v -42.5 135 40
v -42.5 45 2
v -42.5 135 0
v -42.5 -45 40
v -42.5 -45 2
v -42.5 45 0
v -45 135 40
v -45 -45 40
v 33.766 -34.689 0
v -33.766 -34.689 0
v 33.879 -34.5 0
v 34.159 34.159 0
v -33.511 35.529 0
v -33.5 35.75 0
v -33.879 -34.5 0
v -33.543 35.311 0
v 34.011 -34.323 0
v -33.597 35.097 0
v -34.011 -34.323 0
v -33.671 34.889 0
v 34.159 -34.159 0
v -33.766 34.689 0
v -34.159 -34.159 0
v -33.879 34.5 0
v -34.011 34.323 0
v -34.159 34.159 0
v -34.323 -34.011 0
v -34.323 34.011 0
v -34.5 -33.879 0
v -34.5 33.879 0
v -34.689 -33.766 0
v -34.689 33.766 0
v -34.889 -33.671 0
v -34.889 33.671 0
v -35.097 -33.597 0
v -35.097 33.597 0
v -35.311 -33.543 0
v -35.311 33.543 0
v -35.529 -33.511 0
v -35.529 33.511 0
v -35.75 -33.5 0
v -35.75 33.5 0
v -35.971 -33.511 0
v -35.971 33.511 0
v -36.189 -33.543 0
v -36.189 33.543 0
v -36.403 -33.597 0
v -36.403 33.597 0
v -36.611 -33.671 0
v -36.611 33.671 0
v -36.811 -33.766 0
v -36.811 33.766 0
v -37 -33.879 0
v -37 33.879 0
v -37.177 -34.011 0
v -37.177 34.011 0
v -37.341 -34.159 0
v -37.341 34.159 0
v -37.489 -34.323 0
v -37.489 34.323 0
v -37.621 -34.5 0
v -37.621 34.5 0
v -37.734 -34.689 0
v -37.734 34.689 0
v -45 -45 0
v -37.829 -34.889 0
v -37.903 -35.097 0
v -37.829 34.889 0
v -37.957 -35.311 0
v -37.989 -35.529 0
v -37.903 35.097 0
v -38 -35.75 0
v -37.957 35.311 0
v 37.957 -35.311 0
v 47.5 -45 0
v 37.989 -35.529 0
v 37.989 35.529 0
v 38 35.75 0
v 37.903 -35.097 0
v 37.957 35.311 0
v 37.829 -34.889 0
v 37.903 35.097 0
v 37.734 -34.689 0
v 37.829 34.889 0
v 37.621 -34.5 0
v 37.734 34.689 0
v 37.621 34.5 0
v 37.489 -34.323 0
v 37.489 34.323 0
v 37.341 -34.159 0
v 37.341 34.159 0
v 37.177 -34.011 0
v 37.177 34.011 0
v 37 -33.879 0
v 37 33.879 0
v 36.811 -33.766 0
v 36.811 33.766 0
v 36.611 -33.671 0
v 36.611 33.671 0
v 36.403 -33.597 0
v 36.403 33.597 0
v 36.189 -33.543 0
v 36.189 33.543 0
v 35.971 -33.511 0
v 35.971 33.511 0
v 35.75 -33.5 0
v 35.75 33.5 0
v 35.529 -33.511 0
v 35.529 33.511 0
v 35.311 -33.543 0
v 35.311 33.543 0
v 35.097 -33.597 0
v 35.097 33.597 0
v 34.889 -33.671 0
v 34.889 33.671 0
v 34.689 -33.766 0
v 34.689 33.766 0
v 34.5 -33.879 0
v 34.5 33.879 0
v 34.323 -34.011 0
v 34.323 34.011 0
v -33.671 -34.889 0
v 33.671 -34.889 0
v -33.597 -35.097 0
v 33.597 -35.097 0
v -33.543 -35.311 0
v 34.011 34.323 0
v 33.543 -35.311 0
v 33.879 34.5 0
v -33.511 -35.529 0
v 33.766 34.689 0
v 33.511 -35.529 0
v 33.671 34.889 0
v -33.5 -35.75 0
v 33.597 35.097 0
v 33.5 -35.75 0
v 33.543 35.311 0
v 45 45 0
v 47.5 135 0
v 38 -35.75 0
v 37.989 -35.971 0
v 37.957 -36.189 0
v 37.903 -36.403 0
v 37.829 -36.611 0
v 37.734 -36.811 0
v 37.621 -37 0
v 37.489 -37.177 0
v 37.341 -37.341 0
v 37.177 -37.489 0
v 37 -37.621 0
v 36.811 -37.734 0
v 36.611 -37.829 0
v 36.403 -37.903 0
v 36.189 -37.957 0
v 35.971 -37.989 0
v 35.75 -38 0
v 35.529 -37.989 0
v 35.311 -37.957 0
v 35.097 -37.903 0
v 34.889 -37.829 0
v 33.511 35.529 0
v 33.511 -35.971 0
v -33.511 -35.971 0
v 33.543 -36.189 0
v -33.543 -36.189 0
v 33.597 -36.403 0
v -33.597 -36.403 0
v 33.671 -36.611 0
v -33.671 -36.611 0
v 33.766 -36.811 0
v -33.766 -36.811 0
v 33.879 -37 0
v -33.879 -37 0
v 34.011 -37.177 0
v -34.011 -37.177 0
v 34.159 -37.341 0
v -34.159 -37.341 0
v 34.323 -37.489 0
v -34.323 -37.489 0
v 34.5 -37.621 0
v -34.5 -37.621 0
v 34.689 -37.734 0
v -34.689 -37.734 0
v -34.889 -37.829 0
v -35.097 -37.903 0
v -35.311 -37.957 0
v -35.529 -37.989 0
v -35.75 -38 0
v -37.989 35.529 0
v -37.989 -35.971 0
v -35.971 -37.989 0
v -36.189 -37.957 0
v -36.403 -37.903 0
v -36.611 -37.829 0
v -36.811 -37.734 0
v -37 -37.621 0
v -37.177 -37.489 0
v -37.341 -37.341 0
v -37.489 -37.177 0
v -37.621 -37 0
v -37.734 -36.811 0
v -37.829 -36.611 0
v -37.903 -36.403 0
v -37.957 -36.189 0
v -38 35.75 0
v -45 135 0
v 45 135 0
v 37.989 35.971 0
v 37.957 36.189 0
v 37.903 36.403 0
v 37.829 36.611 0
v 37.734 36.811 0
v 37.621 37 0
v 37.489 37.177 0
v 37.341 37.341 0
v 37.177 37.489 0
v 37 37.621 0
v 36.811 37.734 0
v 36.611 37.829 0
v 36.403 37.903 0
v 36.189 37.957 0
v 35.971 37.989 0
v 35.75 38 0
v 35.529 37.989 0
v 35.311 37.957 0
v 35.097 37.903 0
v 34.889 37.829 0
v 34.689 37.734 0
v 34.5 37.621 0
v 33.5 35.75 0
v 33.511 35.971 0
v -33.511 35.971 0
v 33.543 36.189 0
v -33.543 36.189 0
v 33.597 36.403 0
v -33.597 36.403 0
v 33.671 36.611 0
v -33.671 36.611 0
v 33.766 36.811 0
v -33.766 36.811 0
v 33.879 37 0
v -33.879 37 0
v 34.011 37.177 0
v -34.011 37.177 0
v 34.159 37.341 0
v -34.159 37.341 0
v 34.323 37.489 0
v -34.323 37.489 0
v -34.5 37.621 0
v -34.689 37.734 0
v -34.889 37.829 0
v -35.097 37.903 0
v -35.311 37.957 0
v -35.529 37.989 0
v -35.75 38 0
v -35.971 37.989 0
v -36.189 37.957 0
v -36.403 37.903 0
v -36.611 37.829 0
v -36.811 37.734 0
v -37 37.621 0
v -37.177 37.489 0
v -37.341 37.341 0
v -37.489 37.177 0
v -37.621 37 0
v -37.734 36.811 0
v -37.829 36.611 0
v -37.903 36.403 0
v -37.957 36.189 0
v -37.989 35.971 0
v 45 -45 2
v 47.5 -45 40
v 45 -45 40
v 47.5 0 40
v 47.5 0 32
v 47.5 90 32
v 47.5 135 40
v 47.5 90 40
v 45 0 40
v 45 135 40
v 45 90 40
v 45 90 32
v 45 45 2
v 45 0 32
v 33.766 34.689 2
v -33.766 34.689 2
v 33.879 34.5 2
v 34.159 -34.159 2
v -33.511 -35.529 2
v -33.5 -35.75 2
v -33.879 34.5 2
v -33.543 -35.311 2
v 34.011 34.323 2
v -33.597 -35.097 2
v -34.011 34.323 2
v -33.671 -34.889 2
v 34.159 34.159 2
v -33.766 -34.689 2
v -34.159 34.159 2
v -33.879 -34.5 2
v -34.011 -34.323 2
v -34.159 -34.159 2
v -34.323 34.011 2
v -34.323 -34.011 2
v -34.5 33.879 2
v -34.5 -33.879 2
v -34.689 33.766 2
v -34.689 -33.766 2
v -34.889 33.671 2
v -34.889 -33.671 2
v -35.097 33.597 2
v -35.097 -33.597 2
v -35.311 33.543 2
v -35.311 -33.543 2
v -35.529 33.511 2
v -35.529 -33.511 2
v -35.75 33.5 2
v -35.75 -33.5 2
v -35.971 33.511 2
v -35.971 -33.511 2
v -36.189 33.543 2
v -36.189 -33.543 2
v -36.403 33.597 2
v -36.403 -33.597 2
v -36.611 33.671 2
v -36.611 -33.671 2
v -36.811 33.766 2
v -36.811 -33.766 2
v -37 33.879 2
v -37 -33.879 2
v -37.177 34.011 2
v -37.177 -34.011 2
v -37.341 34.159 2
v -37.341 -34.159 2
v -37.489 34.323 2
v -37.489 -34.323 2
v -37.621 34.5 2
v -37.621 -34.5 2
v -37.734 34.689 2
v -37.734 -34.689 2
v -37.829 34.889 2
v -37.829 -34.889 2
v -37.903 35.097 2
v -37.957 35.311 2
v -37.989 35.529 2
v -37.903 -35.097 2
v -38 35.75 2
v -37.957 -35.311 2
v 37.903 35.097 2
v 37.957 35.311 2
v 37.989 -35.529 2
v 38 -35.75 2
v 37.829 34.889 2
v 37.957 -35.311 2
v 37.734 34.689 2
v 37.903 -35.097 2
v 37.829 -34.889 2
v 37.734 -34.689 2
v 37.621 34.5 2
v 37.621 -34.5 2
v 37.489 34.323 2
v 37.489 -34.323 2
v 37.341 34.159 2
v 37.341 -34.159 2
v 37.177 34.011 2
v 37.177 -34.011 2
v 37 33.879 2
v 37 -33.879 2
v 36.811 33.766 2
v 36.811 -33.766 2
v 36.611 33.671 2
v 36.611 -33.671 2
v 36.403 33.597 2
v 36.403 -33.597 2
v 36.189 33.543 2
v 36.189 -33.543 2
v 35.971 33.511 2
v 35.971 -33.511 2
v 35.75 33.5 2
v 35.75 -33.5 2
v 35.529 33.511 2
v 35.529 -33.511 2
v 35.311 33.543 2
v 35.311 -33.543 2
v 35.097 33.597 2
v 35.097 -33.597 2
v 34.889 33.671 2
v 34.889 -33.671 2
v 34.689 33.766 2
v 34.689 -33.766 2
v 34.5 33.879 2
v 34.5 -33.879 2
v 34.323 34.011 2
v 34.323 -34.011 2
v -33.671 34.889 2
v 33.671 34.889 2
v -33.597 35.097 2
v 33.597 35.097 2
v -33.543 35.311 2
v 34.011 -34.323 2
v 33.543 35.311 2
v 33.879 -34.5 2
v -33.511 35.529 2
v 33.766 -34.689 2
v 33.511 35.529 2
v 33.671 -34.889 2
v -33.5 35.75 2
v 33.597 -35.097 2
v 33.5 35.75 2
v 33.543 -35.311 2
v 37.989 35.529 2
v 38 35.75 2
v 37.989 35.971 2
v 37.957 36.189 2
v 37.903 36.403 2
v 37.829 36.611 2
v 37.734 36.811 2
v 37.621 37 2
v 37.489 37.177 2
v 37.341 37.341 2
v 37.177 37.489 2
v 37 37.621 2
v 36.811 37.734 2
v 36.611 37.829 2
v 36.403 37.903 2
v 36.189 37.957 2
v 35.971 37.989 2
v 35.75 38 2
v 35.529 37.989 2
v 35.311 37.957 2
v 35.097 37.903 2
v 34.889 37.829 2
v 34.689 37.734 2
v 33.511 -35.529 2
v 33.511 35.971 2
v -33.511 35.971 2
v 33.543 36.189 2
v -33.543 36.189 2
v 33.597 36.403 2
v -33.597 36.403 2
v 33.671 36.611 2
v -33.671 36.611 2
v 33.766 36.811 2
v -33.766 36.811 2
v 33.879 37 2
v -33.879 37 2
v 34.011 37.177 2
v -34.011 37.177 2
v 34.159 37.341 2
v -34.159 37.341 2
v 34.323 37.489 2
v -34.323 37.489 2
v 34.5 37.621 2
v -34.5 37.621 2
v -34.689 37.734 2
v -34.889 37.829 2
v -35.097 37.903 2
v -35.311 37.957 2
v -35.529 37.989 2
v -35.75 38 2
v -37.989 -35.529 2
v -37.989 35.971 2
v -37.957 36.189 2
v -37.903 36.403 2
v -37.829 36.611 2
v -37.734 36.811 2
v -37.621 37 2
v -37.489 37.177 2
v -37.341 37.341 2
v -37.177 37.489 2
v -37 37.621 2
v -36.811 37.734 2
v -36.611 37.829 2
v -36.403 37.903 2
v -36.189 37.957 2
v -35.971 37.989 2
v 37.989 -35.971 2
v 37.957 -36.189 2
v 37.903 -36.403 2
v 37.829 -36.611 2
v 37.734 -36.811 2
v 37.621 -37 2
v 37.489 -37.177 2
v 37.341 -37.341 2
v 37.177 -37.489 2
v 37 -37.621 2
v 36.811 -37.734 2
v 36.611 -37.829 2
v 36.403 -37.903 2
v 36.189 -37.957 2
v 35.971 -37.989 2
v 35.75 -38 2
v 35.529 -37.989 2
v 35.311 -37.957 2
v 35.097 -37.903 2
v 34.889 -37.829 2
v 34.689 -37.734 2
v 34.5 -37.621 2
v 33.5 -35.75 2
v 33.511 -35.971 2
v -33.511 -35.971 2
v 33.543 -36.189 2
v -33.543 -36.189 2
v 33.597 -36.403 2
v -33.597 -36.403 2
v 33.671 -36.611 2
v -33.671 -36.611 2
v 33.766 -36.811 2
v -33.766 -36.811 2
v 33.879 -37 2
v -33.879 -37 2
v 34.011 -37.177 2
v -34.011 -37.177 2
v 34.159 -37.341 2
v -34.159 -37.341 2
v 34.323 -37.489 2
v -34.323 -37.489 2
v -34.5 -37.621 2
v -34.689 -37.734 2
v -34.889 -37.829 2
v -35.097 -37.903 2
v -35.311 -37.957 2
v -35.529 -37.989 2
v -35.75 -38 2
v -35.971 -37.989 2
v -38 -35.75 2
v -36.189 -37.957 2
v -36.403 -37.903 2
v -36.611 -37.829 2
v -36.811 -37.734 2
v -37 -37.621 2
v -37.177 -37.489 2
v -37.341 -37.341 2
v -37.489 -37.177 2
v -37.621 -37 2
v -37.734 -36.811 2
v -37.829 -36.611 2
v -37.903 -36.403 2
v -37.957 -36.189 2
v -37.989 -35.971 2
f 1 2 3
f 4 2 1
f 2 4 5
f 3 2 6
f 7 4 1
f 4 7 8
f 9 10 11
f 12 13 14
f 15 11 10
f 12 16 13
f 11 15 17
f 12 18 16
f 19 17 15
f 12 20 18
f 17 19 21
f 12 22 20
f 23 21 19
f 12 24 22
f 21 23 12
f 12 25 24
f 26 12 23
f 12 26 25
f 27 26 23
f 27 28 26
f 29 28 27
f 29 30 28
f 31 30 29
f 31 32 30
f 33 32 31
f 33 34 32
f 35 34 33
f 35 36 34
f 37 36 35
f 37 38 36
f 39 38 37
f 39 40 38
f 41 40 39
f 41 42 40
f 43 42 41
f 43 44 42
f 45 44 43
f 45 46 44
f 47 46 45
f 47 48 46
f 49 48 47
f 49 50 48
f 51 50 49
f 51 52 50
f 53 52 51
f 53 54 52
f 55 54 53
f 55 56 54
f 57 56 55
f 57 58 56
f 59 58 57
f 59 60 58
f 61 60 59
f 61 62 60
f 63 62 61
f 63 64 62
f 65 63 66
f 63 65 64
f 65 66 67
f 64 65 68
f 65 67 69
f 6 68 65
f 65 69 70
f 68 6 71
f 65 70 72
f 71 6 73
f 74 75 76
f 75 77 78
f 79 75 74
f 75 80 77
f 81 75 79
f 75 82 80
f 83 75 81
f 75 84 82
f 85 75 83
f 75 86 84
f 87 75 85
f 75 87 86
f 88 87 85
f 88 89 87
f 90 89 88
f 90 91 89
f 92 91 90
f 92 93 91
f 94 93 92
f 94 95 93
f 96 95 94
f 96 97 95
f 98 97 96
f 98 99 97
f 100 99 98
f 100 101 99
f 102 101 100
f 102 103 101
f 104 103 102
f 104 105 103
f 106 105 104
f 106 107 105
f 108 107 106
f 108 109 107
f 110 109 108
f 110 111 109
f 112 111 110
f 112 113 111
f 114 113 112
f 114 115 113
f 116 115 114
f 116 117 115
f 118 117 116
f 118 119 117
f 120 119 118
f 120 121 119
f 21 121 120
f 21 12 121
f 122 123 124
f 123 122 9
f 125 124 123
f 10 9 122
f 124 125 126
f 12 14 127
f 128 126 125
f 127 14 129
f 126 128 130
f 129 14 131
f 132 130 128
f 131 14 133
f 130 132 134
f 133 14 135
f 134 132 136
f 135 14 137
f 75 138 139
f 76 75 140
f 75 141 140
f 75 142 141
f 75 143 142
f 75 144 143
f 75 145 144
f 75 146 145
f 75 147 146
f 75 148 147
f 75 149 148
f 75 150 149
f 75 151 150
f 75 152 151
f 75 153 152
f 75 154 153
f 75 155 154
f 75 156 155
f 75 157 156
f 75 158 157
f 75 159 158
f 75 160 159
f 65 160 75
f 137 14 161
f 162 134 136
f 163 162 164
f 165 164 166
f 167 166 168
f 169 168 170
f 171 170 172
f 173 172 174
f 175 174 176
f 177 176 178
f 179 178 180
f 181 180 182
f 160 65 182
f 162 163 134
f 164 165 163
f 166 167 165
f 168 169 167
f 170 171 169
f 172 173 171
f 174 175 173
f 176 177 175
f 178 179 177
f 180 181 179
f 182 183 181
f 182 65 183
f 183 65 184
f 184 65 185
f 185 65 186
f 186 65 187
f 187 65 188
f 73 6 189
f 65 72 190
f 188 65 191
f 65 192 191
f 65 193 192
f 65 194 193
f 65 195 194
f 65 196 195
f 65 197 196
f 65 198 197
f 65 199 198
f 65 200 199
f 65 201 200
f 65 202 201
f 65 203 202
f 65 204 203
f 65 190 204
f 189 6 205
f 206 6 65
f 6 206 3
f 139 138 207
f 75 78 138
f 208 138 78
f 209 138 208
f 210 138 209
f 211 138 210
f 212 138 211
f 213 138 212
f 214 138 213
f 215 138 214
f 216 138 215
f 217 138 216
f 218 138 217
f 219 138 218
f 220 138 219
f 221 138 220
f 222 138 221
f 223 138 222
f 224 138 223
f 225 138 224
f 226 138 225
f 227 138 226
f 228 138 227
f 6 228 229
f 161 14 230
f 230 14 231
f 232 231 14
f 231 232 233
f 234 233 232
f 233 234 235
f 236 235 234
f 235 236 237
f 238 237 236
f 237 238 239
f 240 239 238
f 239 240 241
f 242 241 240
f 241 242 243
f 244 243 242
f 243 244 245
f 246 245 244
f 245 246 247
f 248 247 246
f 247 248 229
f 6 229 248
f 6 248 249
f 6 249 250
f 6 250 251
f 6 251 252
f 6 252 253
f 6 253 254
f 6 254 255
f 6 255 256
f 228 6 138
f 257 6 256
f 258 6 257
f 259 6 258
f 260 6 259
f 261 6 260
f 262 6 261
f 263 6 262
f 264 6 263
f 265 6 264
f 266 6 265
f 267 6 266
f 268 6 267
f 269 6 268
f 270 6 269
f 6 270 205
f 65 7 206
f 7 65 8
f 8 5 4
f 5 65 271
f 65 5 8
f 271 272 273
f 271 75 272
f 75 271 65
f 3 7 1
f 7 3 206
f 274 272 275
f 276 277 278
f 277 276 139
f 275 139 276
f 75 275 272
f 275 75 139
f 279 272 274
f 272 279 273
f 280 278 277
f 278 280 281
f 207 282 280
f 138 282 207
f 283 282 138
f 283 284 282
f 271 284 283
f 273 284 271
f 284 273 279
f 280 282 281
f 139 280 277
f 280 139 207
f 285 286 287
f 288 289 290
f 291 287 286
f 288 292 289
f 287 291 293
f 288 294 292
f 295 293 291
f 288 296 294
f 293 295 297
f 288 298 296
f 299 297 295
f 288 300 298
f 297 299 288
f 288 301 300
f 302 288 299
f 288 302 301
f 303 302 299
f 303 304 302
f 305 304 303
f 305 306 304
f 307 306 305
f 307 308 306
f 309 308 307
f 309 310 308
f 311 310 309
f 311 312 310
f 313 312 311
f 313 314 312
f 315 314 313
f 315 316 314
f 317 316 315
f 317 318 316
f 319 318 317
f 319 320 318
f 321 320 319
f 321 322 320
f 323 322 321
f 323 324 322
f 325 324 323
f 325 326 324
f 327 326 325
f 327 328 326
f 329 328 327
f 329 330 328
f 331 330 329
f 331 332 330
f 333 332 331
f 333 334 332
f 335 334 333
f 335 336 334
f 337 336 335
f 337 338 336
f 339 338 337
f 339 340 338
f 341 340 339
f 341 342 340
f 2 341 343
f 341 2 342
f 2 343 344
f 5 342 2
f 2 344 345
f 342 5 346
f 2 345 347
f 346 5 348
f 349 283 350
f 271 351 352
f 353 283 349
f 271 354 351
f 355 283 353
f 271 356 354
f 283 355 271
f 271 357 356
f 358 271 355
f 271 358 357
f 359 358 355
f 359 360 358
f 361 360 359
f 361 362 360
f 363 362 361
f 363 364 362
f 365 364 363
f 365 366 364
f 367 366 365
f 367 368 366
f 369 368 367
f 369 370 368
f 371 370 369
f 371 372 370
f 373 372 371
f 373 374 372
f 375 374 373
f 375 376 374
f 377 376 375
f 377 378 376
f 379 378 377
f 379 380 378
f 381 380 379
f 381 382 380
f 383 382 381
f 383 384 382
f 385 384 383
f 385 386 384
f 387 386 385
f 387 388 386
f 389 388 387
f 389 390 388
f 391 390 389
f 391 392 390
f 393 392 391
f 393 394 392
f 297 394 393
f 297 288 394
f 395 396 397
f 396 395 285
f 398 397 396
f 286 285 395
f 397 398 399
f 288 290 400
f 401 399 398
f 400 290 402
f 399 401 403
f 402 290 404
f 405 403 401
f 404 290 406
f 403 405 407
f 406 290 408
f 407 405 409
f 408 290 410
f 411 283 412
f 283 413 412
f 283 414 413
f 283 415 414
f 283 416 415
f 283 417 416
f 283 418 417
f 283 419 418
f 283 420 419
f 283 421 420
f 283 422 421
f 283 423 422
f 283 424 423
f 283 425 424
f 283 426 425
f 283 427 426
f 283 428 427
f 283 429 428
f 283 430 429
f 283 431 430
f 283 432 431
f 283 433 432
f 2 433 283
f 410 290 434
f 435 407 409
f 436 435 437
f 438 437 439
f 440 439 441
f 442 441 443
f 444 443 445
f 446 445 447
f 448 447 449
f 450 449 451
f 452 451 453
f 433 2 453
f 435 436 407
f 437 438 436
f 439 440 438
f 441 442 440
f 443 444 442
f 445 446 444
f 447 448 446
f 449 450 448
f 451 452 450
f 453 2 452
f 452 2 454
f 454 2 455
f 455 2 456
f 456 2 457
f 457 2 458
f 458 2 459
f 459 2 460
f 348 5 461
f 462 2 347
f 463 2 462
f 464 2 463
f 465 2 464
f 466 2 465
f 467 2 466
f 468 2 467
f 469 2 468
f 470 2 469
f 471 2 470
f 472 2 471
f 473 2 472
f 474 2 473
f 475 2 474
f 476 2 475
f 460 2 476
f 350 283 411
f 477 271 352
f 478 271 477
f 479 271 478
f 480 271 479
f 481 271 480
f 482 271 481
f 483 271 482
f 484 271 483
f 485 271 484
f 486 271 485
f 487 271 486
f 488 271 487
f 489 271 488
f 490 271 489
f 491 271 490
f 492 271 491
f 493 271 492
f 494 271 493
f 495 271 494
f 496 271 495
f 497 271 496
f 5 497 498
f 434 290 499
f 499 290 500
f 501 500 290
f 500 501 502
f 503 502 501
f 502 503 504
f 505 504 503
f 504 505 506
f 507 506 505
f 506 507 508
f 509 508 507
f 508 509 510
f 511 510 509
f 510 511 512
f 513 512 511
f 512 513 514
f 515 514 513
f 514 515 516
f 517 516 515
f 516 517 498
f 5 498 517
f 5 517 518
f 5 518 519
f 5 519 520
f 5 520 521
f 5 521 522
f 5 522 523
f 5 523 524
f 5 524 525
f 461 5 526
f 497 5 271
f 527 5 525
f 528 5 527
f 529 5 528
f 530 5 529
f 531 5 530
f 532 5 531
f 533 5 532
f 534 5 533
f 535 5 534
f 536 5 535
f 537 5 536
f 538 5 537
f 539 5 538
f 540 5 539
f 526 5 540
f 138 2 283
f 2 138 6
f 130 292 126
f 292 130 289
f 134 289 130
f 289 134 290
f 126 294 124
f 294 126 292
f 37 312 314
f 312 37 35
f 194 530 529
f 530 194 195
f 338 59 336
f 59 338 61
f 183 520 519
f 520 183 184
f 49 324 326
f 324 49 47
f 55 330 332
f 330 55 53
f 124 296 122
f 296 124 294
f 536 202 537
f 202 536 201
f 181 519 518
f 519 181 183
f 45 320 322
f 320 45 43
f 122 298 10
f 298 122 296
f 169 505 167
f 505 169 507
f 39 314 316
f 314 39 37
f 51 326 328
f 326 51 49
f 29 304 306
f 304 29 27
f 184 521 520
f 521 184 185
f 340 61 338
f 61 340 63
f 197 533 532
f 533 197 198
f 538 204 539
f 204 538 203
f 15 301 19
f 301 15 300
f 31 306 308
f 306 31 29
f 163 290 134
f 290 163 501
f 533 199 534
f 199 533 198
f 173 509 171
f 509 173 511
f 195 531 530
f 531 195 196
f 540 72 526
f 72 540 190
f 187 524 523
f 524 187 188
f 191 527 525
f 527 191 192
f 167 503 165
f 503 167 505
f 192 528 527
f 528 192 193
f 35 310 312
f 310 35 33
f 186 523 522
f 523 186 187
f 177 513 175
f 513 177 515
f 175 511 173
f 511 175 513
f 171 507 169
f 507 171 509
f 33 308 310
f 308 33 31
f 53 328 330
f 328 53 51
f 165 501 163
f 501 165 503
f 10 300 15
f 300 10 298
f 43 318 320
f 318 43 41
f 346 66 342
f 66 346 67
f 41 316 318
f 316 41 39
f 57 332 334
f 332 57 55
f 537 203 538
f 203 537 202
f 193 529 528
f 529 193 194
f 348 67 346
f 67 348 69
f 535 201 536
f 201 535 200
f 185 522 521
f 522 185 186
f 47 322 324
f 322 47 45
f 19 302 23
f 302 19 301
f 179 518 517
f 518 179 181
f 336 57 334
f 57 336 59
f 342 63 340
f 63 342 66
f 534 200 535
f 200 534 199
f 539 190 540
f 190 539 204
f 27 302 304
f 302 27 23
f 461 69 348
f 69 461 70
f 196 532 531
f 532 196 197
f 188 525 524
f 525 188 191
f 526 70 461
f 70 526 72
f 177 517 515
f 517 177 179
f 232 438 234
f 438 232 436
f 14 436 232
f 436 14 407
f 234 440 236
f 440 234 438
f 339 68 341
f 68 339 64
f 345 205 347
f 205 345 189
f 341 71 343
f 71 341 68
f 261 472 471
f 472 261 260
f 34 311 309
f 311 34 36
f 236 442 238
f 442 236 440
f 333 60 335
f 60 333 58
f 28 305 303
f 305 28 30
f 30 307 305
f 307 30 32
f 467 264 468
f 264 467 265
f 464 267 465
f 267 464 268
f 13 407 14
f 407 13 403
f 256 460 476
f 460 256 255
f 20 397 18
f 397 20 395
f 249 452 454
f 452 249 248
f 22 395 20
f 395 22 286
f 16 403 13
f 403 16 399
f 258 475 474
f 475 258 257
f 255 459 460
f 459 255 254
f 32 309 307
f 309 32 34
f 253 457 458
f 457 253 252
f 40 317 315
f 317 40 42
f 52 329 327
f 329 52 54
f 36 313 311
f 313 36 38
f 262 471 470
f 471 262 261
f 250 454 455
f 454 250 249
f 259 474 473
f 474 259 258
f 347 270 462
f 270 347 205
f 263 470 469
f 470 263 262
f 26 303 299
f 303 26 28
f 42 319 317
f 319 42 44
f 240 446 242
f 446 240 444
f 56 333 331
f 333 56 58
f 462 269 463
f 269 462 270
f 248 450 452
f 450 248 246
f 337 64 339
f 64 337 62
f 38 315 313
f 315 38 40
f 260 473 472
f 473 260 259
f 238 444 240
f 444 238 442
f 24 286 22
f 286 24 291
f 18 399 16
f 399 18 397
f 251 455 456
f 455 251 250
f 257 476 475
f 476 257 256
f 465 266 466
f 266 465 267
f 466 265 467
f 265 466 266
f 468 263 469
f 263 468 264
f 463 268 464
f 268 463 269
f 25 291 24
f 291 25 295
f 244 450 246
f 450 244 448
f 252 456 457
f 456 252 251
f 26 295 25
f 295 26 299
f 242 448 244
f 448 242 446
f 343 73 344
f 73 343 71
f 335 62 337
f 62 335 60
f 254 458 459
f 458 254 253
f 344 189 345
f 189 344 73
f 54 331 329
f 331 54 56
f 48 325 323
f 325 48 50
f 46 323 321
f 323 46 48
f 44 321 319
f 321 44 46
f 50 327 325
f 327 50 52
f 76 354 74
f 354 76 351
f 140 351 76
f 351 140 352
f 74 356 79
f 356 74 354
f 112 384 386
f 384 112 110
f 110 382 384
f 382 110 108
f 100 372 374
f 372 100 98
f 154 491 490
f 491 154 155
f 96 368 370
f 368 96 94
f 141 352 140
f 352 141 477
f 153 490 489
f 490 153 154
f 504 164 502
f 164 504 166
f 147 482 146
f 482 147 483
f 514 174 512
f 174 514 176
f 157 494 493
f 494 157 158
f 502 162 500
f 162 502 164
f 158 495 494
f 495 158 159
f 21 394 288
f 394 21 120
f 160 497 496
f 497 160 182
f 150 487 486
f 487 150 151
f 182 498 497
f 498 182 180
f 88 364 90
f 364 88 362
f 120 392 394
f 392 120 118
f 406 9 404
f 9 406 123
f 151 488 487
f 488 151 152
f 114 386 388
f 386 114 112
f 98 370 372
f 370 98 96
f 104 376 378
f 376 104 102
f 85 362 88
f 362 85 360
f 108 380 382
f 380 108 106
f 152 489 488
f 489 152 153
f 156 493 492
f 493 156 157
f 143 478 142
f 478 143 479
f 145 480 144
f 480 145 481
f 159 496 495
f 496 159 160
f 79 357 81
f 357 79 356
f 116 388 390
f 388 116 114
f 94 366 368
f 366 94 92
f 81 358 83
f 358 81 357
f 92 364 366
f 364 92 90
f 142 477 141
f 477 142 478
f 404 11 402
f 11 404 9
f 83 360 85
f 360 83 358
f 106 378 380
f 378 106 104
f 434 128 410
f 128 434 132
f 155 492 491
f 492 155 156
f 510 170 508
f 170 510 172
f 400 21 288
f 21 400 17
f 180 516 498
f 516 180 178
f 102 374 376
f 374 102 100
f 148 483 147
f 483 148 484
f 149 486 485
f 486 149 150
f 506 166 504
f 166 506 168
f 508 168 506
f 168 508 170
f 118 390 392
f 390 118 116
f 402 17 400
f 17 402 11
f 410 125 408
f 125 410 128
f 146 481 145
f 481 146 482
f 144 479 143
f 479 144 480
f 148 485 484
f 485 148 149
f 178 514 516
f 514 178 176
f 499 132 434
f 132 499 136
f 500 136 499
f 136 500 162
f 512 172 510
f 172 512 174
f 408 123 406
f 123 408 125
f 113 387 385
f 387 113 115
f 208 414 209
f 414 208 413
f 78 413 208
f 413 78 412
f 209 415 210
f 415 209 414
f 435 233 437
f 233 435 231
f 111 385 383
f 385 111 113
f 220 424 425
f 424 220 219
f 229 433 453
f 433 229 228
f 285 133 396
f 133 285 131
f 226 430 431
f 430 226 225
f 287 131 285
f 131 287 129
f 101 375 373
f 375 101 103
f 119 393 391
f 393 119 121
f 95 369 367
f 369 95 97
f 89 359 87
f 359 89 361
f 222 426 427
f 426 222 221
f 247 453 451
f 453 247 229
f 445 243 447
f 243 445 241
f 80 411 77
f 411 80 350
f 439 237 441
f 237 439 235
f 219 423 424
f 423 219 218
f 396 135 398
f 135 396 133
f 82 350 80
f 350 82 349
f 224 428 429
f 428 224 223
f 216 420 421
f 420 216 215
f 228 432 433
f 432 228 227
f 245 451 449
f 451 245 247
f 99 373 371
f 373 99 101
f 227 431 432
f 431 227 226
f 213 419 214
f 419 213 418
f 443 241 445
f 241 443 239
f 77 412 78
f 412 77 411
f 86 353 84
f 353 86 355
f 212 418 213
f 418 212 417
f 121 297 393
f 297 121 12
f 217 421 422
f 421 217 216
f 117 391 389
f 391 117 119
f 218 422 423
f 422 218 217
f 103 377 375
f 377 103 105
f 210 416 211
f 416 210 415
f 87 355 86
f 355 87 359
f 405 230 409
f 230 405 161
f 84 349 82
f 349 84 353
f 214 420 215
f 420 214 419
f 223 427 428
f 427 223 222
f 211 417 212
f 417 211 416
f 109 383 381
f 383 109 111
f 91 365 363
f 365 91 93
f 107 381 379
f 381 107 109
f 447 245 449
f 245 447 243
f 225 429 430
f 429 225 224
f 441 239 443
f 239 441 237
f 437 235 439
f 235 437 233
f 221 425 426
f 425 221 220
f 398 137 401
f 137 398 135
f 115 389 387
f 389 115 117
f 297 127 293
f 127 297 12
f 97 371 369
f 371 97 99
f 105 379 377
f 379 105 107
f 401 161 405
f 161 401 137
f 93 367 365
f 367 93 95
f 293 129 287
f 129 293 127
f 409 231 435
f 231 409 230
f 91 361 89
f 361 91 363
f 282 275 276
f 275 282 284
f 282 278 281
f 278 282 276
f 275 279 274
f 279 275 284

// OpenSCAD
// Housing for a DIY magnetic stirrer built from an 80 mm PC case fan
// Printed upside down: top plate on the bed, box open at the top.

$fn = 64;

// ---- Dimensions (mm) ----
fan_outer      = 80;    // fan outer size (reference)
housing_outer  = 90;    // housing outer size (X x Y)
top_thick      = 2;     // top plate thickness (z = 0 to 2)
wall_thick     = 2.5;   // wall thickness
total_h       = 40;     // overall height (top of walls)
cable_h       = 8;     // cable notch depth from open edge (z = 32 to 40)
screw_pitch   = 71.5;   // square pitch for M4 screw holes
screw_d       = 4.5;    // M4 screw hole diameter

eps           = 0.5;   // cutter overshoot past faces

difference() {
    union() {
        // Top plate
        translate([-housing_outer/2, -housing_outer/2, 0])
            cube([housing_outer, housing_outer, top_thick]);
        // Four walls
        for (x = [-1, 1])
            for (y = [-1, 1])
                translate([x * housing_outer/2, y * housing_outer/2, 0])
                    cube([wall_thick, housing_outer, total_h]);
    }

    // M4 screw holes through top plate, centred on plate
    for (x = [-screw_pitch/2, screw_pitch/2])
        for (y = [-screw_pitch/2, screw_pitch/2])
            translate([x, y, -eps])
                cylinder(d = screw_d, h = top_thick + 2*eps);

    // Cable notch in one wall, centred along the wall
    translate([housing_outer/2 - 6, 0, total_h - cable_h])
        cube([12, housing_outer, cable_h + eps]);
}
